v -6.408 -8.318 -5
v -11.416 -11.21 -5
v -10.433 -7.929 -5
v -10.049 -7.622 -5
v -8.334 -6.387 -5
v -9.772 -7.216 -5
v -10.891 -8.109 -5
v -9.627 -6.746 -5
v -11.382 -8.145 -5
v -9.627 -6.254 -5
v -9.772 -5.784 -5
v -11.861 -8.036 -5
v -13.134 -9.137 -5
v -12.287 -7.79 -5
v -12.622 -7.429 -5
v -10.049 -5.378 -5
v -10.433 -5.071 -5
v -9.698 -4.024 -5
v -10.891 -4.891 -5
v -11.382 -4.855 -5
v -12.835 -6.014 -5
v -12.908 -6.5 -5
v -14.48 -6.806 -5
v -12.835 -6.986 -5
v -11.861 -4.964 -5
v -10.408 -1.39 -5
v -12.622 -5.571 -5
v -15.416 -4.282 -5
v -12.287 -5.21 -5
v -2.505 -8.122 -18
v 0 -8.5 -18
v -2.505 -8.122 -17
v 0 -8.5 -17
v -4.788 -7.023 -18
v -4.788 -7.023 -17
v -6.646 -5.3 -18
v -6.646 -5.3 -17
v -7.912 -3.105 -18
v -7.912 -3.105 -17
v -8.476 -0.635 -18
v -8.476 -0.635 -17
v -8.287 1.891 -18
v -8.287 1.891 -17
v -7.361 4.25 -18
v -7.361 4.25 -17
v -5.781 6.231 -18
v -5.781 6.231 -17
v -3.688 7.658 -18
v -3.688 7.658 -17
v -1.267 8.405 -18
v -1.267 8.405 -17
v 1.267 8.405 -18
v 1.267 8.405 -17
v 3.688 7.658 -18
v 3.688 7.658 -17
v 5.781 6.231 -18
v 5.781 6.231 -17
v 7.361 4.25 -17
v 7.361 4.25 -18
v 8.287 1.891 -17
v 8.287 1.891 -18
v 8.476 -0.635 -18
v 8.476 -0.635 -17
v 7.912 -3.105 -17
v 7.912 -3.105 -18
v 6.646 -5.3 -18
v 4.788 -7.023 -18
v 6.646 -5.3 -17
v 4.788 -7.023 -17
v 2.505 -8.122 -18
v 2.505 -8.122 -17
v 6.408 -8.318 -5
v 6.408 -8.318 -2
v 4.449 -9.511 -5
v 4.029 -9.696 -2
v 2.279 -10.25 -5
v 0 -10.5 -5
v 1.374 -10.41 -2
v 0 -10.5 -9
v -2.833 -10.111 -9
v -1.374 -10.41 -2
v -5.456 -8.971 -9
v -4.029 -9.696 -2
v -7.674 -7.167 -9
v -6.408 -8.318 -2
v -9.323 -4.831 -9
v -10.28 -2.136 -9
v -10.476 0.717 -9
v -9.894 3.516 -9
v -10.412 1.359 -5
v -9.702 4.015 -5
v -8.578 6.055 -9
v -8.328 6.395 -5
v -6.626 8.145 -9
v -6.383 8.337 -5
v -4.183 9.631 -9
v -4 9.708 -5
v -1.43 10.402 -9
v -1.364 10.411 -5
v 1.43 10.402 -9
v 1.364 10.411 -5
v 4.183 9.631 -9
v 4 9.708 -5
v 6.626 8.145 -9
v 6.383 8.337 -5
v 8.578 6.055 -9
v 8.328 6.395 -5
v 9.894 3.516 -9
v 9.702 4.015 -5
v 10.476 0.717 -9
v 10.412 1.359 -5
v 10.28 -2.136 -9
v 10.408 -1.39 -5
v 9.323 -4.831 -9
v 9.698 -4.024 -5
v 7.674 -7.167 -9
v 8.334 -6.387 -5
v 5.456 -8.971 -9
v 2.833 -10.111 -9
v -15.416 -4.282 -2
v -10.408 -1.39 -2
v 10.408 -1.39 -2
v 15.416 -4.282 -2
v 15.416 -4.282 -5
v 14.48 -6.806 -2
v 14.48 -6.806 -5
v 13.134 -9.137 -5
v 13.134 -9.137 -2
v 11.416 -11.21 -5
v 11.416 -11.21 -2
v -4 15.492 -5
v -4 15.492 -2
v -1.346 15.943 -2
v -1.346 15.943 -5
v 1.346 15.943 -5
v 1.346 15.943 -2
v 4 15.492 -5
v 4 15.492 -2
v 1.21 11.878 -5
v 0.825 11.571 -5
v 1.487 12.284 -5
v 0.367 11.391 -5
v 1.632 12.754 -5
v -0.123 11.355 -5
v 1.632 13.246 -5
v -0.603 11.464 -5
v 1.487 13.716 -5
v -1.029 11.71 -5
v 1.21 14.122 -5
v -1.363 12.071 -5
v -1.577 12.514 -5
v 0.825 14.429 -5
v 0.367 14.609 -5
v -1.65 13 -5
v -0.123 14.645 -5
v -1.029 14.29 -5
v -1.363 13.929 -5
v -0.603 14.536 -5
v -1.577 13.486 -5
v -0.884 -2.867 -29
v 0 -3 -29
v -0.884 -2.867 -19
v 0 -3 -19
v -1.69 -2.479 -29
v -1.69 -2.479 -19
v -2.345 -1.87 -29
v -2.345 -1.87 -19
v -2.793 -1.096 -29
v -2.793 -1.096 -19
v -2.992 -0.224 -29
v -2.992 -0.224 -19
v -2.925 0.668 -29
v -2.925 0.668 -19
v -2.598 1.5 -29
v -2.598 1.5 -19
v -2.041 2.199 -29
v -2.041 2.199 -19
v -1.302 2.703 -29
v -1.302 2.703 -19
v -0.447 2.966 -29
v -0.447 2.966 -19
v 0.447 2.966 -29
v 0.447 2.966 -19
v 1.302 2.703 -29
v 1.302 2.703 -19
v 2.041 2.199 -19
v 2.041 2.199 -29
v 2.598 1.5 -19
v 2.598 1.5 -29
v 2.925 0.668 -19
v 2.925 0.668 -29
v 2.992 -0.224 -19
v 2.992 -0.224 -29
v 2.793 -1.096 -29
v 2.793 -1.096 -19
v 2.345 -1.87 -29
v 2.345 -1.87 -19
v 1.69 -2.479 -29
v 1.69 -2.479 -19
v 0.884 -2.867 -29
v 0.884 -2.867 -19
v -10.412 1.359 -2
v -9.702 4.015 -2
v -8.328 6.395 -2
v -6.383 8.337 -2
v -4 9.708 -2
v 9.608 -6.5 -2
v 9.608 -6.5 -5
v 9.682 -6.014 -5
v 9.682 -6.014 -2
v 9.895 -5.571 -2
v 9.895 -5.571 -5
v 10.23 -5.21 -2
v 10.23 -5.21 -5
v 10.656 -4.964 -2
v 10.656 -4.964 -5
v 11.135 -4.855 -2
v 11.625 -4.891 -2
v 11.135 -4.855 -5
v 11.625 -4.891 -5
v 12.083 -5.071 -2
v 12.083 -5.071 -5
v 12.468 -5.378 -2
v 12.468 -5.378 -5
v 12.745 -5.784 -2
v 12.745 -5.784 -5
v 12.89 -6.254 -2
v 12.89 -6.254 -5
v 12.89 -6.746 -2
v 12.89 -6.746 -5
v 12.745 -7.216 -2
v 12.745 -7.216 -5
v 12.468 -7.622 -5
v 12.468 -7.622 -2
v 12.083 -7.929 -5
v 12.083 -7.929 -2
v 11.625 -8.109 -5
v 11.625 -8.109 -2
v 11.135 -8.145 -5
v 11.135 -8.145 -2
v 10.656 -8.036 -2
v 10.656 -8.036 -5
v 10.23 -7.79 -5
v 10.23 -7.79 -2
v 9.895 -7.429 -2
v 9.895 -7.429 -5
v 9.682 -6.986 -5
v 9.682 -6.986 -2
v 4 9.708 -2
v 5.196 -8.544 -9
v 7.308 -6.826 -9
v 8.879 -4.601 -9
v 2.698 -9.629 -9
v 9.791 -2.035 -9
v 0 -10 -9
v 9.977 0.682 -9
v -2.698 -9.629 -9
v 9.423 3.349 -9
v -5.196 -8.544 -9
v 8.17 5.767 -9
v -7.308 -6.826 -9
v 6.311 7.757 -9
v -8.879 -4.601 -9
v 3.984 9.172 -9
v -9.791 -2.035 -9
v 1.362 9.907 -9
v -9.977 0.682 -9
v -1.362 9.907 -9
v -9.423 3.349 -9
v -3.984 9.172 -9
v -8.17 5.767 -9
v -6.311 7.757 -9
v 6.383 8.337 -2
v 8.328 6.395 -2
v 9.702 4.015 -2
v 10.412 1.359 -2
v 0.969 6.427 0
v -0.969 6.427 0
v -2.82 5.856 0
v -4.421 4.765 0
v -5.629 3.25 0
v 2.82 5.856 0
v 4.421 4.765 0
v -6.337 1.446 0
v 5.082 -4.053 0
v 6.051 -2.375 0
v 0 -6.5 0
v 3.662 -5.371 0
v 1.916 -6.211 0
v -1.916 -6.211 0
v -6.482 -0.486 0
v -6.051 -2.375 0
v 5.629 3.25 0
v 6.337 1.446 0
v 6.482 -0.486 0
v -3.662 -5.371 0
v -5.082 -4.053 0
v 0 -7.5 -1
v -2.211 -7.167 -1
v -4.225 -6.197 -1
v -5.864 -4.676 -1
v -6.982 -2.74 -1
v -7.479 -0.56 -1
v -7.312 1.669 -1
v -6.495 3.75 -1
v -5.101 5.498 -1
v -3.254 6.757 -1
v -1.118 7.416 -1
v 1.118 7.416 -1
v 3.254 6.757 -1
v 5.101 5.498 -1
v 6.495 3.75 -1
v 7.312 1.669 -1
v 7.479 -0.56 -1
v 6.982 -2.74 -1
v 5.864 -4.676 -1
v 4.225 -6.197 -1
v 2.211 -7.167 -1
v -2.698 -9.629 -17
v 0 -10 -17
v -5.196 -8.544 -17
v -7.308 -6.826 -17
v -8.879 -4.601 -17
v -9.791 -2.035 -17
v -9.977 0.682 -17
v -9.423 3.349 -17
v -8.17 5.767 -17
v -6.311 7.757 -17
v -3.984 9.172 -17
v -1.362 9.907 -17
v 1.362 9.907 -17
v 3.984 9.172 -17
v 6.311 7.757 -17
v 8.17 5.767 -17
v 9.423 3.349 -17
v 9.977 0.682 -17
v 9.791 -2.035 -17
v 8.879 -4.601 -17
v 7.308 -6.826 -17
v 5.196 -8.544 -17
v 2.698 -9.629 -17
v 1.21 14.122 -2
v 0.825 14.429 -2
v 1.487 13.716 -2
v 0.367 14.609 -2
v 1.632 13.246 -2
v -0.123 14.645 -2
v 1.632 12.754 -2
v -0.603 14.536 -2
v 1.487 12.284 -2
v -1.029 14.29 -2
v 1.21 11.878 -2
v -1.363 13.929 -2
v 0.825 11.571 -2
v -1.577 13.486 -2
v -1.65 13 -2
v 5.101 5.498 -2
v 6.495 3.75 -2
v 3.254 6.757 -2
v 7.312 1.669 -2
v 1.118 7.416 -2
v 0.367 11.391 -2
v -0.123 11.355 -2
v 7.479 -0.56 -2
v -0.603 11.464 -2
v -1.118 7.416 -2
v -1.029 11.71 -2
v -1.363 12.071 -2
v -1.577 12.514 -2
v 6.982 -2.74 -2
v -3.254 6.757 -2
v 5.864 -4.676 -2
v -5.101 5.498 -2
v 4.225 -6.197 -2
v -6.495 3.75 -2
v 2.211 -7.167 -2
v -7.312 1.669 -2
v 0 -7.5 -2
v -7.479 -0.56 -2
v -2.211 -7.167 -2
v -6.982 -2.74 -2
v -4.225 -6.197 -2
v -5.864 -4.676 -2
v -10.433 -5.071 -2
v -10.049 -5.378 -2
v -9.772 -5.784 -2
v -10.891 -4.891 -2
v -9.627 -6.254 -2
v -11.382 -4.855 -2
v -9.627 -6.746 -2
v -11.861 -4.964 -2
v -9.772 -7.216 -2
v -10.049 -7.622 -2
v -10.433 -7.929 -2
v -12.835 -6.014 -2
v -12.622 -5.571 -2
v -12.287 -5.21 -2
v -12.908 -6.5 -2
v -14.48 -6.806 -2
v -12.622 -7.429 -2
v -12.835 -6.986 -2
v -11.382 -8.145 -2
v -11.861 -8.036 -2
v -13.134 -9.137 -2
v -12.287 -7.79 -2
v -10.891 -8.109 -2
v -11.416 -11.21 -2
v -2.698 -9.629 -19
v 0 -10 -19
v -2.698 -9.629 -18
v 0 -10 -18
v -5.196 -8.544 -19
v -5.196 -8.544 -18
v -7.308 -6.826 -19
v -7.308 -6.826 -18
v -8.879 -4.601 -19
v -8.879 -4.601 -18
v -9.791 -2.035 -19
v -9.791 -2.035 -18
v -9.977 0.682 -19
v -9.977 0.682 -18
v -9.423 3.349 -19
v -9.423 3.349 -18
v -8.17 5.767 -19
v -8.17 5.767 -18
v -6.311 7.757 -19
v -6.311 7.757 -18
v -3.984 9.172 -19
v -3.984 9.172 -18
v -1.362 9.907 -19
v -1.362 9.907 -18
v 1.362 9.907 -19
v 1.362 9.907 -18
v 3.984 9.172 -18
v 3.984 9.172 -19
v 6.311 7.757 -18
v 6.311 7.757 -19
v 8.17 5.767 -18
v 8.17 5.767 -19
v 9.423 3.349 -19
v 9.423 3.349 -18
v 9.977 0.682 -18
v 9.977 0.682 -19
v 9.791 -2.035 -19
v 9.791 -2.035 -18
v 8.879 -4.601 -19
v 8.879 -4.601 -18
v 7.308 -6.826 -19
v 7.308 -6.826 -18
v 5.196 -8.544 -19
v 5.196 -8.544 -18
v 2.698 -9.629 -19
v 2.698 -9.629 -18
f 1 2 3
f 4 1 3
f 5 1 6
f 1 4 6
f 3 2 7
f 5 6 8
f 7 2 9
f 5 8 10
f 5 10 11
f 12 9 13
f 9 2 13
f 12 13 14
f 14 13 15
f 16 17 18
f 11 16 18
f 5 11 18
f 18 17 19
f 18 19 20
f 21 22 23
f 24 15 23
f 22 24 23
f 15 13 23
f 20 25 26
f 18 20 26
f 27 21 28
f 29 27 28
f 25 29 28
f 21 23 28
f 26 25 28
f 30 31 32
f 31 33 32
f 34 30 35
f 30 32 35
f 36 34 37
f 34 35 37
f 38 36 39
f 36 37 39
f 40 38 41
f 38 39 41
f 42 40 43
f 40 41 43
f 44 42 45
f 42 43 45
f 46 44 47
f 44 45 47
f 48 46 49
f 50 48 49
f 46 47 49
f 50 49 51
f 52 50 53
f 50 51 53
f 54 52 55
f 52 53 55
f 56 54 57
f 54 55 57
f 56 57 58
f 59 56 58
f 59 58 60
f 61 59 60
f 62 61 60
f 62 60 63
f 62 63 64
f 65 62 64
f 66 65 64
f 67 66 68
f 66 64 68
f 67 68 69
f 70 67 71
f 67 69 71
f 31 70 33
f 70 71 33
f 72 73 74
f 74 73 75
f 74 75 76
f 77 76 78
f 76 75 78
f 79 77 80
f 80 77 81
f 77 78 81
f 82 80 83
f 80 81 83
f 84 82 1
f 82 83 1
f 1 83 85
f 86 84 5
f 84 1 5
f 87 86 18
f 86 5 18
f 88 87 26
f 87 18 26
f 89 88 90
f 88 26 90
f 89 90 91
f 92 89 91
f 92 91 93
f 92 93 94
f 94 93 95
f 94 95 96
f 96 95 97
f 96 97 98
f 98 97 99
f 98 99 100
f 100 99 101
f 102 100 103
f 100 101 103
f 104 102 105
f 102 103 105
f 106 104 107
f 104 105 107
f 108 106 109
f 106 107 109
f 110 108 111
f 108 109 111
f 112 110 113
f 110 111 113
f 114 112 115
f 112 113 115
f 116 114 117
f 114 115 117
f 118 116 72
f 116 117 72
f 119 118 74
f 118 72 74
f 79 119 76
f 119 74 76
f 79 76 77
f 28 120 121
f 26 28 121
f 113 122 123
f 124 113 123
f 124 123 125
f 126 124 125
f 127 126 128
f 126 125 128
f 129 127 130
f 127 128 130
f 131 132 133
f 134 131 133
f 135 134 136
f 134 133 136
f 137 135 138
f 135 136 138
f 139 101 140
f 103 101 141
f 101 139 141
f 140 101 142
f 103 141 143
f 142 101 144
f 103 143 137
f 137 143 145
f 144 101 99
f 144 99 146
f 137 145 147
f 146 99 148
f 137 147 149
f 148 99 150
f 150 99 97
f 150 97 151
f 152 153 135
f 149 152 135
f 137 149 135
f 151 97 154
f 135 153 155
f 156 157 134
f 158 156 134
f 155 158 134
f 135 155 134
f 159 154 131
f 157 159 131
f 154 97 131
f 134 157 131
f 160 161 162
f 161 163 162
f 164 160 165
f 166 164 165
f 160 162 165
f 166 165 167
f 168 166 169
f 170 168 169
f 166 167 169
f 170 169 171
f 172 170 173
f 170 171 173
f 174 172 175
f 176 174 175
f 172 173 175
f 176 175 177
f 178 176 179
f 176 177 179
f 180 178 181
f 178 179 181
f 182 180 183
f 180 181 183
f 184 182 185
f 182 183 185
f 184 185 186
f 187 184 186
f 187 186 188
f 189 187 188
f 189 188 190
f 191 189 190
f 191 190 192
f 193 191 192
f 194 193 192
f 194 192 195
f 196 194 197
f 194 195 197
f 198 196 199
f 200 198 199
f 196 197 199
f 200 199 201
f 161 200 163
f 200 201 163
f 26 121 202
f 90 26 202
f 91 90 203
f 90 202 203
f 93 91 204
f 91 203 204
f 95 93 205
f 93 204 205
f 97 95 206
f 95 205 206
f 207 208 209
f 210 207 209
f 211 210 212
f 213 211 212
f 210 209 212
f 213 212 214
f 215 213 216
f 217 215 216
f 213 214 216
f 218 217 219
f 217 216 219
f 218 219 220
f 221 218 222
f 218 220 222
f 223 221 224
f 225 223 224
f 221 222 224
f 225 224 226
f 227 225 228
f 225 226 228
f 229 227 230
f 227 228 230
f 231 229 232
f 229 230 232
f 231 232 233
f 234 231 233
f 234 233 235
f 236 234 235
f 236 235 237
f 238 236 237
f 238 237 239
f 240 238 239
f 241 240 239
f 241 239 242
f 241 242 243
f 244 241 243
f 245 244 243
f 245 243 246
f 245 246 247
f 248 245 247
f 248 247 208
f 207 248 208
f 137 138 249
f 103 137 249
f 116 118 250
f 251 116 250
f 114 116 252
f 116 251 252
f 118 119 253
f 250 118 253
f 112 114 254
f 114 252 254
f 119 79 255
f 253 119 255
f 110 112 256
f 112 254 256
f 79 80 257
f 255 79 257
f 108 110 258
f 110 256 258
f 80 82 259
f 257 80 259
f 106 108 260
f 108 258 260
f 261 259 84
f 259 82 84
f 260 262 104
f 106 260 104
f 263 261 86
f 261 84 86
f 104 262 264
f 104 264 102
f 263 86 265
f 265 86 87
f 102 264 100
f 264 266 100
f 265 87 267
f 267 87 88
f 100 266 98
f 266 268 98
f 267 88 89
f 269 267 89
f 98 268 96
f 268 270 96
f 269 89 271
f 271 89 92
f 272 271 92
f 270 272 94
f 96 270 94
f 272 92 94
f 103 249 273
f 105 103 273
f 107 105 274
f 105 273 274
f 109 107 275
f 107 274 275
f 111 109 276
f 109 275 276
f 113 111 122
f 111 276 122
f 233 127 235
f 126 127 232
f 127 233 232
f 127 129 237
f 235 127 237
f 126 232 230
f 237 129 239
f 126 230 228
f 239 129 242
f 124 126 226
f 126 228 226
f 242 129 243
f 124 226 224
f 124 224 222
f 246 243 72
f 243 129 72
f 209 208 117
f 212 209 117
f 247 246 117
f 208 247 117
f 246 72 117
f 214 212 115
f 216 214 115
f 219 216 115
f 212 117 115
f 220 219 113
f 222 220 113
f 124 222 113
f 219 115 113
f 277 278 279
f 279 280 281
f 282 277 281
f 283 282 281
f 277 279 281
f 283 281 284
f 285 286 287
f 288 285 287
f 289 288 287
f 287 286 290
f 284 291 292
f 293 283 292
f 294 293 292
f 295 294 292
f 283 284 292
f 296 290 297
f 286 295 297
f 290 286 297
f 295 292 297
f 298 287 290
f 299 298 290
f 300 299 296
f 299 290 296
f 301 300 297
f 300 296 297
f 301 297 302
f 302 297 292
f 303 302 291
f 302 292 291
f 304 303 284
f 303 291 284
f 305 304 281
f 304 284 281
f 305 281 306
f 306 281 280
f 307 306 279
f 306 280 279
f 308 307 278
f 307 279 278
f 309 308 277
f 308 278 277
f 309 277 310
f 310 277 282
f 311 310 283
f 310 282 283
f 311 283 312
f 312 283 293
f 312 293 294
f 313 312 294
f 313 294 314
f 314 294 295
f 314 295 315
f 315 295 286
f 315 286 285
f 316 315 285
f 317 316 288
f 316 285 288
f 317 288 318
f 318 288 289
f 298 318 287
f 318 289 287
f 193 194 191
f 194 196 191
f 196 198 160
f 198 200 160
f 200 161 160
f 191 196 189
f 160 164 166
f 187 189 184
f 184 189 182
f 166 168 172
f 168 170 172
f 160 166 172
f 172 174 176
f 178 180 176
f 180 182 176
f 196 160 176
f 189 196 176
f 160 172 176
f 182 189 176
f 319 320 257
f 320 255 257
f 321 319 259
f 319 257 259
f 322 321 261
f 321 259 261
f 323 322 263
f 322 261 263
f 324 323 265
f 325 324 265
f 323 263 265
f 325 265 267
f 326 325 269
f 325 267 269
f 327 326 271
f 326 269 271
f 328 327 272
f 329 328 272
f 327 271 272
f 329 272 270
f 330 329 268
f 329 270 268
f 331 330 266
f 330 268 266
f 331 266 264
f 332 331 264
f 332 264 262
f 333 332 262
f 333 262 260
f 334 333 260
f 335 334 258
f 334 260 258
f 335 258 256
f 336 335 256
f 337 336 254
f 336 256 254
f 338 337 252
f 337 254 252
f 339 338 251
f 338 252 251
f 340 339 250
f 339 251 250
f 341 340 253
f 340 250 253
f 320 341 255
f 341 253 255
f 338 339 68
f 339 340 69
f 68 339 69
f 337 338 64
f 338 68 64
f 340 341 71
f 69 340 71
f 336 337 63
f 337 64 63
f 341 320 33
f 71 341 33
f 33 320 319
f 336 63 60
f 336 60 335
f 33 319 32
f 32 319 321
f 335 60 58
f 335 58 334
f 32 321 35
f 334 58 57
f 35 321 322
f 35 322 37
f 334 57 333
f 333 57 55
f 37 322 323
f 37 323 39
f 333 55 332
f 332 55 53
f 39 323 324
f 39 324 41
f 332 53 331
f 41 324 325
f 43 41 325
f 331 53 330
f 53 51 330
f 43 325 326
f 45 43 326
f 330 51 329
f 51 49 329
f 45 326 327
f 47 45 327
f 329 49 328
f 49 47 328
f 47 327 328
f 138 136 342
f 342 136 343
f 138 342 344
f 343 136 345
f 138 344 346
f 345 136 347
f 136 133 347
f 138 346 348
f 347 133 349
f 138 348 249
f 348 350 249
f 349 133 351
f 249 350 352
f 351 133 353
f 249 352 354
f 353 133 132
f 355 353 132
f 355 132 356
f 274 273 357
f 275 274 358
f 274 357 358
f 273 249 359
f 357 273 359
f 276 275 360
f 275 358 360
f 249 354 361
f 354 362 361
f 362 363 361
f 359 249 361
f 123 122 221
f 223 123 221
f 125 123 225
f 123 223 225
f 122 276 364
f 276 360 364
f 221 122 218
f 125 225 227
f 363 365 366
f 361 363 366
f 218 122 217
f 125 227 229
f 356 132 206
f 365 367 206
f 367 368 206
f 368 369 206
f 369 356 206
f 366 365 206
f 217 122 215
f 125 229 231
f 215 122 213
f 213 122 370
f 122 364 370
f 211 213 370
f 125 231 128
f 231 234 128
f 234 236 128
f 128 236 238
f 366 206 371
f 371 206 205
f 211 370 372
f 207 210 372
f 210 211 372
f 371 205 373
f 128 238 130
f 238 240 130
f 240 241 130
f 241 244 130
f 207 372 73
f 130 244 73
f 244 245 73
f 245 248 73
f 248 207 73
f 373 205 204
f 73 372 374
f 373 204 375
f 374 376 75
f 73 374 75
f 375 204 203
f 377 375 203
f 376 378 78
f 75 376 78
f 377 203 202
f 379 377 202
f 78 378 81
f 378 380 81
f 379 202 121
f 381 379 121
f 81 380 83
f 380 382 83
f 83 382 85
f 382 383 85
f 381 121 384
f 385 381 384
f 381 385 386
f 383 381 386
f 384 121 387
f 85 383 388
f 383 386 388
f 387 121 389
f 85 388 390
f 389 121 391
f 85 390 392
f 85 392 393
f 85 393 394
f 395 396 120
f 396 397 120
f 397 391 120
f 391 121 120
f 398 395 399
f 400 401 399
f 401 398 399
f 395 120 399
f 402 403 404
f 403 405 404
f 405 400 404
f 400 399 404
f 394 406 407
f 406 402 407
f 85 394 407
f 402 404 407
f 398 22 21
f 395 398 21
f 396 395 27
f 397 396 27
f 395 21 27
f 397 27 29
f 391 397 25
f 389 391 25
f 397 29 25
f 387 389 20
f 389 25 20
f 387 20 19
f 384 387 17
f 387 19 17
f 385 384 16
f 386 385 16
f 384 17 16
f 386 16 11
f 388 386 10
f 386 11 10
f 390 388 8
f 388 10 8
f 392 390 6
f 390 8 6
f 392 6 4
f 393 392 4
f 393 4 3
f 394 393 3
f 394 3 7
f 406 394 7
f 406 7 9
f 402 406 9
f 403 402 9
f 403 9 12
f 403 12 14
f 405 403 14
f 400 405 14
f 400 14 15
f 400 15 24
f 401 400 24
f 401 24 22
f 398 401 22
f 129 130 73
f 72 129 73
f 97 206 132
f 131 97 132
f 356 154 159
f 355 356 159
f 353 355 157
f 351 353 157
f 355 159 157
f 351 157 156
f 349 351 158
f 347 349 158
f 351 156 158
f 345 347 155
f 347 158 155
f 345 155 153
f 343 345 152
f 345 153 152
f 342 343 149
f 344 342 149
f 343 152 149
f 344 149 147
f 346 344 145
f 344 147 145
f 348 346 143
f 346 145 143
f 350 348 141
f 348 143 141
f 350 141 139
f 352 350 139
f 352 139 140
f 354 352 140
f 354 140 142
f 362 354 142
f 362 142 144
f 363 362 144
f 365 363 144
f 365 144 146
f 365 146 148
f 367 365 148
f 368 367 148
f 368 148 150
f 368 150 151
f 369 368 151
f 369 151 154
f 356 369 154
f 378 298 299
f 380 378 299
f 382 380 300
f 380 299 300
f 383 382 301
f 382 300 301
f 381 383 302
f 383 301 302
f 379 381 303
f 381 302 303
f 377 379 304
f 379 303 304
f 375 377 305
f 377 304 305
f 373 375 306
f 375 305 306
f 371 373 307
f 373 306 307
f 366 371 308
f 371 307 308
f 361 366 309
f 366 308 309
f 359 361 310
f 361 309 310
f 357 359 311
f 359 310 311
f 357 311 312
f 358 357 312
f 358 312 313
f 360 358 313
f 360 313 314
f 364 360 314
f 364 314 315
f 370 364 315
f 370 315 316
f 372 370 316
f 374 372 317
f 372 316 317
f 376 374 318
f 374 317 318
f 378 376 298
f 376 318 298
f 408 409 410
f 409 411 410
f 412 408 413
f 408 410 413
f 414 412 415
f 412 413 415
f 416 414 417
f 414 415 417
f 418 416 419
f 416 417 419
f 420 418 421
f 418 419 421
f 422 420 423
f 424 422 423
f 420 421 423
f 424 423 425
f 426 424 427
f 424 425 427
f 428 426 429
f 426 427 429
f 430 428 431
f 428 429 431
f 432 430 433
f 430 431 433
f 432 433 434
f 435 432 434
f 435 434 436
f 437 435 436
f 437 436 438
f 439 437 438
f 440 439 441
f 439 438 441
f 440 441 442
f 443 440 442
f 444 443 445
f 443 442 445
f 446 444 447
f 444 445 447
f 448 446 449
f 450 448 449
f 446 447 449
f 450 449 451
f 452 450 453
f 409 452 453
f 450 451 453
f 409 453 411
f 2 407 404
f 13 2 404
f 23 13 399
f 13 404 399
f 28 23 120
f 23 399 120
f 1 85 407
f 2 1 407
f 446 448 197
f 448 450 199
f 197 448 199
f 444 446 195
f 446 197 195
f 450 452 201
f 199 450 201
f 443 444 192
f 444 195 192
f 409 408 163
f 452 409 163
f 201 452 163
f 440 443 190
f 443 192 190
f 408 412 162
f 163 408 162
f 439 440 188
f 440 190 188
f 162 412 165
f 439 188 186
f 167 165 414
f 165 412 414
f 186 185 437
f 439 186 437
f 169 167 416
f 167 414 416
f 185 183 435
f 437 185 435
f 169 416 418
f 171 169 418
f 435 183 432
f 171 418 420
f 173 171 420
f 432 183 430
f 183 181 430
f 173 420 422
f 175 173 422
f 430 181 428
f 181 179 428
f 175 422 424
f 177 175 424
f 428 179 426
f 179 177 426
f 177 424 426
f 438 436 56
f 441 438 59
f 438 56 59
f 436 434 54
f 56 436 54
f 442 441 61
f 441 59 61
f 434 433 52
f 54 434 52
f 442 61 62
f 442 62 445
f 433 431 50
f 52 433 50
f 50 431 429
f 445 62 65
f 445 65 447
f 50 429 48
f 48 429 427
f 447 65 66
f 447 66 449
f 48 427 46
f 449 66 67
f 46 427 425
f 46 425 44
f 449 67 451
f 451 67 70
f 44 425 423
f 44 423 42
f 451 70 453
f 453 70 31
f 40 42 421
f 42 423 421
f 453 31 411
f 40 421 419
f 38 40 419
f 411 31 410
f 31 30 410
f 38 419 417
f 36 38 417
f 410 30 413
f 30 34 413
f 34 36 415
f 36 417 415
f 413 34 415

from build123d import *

# Parameters (mm, degrees)
HOLE_WIZARD_M4_1_D  = 3.3
SKETCH_4_OUTSIDE_W  = 44.75
SKETCH_4_OUTSIDE_H  = 44.75
CUT_EXTRUDE_4_DEPTH = 3
CHAMFER_1_SIZE      = 1


with BuildPart() as part:
    # 草图1 → 旋转1 (revolve)
    with BuildSketch(Plane(origin=(0, 0, 0), x_dir=(0, 0, -1), z_dir=(1, 0, 0)), mode=Mode.PRIVATE) as revolve_1_sk:
        Polygon((0, 0), (29, 0), (29, 3), (19, 3), (19, 10), (18, 10), (18, 8.5), (17, 8.5), (17, 10), (9, 10), (9, 10.5), (5, 10.5), (5, 16), (2, 16), (2, 7.5), (0, 7.5), align=None)
    revolve(revolve_1_sk.sketch.rotate(Axis((0, 0, 0), (0, 0, -1)), 180), axis=Axis((0, 0, 0), (0, 0, -1)))

    # M4 螺纹孔1 (through all)
    with Locations(Plane.XY.offset(-2)):
        with Locations((0, 13), (11.258330249, -6.5), (-11.258330249, -6.5)):
            Hole(HOLE_WIZARD_M4_1_D / 2)

    # 草图4 outside → 切除-拉伸4 (cut)
    with BuildSketch(Plane.XY.offset(-2)):
        Rectangle(SKETCH_4_OUTSIDE_W, SKETCH_4_OUTSIDE_H)
        with BuildLine():
            Line((4, 15.491933385), (4, 9.708243919))
            ThreePointArc((4, 9.708243919), (9.09326674, 5.25), (10.40758586, -1.390020345))
            Line((10.40758586, -1.390020345), (15.416407865, -4.281865077))
            ThreePointArc((15.416407865, -4.281865077), (13.856406461, -8), (11.416407865, -11.210068308))
            Line((11.416407865, -11.210068308), (6.40758586, -8.318223575))
            ThreePointArc((6.40758586, -8.318223575), (0, -10.5), (-6.40758586, -8.318223575))
            Line((-6.40758586, -8.318223575), (-11.416407865, -11.210068308))
            ThreePointArc((-11.416407865, -11.210068308), (-13.856406461, -8), (-15.416407865, -4.281865077))
            Line((-15.416407865, -4.281865077), (-10.40758586, -1.390020345))
            ThreePointArc((-10.40758586, -1.390020345), (-9.09326674, 5.25), (-4, 9.708243919))
            Line((-4, 9.708243919), (-4, 15.491933385))
            ThreePointArc((-4, 15.491933385), (0, 16), (4, 15.491933385))
        make_face(mode=Mode.SUBTRACT)
    extrude(amount=-CUT_EXTRUDE_4_DEPTH, mode=Mode.SUBTRACT)

    # 倒角1
    chamfer_1_edges = [part.edges().sort_by_distance(p)[0] for p in [
        (0, 7.5, 0),
    ]]
    chamfer(chamfer_1_edges, length=CHAMFER_1_SIZE)


solid = part.part
